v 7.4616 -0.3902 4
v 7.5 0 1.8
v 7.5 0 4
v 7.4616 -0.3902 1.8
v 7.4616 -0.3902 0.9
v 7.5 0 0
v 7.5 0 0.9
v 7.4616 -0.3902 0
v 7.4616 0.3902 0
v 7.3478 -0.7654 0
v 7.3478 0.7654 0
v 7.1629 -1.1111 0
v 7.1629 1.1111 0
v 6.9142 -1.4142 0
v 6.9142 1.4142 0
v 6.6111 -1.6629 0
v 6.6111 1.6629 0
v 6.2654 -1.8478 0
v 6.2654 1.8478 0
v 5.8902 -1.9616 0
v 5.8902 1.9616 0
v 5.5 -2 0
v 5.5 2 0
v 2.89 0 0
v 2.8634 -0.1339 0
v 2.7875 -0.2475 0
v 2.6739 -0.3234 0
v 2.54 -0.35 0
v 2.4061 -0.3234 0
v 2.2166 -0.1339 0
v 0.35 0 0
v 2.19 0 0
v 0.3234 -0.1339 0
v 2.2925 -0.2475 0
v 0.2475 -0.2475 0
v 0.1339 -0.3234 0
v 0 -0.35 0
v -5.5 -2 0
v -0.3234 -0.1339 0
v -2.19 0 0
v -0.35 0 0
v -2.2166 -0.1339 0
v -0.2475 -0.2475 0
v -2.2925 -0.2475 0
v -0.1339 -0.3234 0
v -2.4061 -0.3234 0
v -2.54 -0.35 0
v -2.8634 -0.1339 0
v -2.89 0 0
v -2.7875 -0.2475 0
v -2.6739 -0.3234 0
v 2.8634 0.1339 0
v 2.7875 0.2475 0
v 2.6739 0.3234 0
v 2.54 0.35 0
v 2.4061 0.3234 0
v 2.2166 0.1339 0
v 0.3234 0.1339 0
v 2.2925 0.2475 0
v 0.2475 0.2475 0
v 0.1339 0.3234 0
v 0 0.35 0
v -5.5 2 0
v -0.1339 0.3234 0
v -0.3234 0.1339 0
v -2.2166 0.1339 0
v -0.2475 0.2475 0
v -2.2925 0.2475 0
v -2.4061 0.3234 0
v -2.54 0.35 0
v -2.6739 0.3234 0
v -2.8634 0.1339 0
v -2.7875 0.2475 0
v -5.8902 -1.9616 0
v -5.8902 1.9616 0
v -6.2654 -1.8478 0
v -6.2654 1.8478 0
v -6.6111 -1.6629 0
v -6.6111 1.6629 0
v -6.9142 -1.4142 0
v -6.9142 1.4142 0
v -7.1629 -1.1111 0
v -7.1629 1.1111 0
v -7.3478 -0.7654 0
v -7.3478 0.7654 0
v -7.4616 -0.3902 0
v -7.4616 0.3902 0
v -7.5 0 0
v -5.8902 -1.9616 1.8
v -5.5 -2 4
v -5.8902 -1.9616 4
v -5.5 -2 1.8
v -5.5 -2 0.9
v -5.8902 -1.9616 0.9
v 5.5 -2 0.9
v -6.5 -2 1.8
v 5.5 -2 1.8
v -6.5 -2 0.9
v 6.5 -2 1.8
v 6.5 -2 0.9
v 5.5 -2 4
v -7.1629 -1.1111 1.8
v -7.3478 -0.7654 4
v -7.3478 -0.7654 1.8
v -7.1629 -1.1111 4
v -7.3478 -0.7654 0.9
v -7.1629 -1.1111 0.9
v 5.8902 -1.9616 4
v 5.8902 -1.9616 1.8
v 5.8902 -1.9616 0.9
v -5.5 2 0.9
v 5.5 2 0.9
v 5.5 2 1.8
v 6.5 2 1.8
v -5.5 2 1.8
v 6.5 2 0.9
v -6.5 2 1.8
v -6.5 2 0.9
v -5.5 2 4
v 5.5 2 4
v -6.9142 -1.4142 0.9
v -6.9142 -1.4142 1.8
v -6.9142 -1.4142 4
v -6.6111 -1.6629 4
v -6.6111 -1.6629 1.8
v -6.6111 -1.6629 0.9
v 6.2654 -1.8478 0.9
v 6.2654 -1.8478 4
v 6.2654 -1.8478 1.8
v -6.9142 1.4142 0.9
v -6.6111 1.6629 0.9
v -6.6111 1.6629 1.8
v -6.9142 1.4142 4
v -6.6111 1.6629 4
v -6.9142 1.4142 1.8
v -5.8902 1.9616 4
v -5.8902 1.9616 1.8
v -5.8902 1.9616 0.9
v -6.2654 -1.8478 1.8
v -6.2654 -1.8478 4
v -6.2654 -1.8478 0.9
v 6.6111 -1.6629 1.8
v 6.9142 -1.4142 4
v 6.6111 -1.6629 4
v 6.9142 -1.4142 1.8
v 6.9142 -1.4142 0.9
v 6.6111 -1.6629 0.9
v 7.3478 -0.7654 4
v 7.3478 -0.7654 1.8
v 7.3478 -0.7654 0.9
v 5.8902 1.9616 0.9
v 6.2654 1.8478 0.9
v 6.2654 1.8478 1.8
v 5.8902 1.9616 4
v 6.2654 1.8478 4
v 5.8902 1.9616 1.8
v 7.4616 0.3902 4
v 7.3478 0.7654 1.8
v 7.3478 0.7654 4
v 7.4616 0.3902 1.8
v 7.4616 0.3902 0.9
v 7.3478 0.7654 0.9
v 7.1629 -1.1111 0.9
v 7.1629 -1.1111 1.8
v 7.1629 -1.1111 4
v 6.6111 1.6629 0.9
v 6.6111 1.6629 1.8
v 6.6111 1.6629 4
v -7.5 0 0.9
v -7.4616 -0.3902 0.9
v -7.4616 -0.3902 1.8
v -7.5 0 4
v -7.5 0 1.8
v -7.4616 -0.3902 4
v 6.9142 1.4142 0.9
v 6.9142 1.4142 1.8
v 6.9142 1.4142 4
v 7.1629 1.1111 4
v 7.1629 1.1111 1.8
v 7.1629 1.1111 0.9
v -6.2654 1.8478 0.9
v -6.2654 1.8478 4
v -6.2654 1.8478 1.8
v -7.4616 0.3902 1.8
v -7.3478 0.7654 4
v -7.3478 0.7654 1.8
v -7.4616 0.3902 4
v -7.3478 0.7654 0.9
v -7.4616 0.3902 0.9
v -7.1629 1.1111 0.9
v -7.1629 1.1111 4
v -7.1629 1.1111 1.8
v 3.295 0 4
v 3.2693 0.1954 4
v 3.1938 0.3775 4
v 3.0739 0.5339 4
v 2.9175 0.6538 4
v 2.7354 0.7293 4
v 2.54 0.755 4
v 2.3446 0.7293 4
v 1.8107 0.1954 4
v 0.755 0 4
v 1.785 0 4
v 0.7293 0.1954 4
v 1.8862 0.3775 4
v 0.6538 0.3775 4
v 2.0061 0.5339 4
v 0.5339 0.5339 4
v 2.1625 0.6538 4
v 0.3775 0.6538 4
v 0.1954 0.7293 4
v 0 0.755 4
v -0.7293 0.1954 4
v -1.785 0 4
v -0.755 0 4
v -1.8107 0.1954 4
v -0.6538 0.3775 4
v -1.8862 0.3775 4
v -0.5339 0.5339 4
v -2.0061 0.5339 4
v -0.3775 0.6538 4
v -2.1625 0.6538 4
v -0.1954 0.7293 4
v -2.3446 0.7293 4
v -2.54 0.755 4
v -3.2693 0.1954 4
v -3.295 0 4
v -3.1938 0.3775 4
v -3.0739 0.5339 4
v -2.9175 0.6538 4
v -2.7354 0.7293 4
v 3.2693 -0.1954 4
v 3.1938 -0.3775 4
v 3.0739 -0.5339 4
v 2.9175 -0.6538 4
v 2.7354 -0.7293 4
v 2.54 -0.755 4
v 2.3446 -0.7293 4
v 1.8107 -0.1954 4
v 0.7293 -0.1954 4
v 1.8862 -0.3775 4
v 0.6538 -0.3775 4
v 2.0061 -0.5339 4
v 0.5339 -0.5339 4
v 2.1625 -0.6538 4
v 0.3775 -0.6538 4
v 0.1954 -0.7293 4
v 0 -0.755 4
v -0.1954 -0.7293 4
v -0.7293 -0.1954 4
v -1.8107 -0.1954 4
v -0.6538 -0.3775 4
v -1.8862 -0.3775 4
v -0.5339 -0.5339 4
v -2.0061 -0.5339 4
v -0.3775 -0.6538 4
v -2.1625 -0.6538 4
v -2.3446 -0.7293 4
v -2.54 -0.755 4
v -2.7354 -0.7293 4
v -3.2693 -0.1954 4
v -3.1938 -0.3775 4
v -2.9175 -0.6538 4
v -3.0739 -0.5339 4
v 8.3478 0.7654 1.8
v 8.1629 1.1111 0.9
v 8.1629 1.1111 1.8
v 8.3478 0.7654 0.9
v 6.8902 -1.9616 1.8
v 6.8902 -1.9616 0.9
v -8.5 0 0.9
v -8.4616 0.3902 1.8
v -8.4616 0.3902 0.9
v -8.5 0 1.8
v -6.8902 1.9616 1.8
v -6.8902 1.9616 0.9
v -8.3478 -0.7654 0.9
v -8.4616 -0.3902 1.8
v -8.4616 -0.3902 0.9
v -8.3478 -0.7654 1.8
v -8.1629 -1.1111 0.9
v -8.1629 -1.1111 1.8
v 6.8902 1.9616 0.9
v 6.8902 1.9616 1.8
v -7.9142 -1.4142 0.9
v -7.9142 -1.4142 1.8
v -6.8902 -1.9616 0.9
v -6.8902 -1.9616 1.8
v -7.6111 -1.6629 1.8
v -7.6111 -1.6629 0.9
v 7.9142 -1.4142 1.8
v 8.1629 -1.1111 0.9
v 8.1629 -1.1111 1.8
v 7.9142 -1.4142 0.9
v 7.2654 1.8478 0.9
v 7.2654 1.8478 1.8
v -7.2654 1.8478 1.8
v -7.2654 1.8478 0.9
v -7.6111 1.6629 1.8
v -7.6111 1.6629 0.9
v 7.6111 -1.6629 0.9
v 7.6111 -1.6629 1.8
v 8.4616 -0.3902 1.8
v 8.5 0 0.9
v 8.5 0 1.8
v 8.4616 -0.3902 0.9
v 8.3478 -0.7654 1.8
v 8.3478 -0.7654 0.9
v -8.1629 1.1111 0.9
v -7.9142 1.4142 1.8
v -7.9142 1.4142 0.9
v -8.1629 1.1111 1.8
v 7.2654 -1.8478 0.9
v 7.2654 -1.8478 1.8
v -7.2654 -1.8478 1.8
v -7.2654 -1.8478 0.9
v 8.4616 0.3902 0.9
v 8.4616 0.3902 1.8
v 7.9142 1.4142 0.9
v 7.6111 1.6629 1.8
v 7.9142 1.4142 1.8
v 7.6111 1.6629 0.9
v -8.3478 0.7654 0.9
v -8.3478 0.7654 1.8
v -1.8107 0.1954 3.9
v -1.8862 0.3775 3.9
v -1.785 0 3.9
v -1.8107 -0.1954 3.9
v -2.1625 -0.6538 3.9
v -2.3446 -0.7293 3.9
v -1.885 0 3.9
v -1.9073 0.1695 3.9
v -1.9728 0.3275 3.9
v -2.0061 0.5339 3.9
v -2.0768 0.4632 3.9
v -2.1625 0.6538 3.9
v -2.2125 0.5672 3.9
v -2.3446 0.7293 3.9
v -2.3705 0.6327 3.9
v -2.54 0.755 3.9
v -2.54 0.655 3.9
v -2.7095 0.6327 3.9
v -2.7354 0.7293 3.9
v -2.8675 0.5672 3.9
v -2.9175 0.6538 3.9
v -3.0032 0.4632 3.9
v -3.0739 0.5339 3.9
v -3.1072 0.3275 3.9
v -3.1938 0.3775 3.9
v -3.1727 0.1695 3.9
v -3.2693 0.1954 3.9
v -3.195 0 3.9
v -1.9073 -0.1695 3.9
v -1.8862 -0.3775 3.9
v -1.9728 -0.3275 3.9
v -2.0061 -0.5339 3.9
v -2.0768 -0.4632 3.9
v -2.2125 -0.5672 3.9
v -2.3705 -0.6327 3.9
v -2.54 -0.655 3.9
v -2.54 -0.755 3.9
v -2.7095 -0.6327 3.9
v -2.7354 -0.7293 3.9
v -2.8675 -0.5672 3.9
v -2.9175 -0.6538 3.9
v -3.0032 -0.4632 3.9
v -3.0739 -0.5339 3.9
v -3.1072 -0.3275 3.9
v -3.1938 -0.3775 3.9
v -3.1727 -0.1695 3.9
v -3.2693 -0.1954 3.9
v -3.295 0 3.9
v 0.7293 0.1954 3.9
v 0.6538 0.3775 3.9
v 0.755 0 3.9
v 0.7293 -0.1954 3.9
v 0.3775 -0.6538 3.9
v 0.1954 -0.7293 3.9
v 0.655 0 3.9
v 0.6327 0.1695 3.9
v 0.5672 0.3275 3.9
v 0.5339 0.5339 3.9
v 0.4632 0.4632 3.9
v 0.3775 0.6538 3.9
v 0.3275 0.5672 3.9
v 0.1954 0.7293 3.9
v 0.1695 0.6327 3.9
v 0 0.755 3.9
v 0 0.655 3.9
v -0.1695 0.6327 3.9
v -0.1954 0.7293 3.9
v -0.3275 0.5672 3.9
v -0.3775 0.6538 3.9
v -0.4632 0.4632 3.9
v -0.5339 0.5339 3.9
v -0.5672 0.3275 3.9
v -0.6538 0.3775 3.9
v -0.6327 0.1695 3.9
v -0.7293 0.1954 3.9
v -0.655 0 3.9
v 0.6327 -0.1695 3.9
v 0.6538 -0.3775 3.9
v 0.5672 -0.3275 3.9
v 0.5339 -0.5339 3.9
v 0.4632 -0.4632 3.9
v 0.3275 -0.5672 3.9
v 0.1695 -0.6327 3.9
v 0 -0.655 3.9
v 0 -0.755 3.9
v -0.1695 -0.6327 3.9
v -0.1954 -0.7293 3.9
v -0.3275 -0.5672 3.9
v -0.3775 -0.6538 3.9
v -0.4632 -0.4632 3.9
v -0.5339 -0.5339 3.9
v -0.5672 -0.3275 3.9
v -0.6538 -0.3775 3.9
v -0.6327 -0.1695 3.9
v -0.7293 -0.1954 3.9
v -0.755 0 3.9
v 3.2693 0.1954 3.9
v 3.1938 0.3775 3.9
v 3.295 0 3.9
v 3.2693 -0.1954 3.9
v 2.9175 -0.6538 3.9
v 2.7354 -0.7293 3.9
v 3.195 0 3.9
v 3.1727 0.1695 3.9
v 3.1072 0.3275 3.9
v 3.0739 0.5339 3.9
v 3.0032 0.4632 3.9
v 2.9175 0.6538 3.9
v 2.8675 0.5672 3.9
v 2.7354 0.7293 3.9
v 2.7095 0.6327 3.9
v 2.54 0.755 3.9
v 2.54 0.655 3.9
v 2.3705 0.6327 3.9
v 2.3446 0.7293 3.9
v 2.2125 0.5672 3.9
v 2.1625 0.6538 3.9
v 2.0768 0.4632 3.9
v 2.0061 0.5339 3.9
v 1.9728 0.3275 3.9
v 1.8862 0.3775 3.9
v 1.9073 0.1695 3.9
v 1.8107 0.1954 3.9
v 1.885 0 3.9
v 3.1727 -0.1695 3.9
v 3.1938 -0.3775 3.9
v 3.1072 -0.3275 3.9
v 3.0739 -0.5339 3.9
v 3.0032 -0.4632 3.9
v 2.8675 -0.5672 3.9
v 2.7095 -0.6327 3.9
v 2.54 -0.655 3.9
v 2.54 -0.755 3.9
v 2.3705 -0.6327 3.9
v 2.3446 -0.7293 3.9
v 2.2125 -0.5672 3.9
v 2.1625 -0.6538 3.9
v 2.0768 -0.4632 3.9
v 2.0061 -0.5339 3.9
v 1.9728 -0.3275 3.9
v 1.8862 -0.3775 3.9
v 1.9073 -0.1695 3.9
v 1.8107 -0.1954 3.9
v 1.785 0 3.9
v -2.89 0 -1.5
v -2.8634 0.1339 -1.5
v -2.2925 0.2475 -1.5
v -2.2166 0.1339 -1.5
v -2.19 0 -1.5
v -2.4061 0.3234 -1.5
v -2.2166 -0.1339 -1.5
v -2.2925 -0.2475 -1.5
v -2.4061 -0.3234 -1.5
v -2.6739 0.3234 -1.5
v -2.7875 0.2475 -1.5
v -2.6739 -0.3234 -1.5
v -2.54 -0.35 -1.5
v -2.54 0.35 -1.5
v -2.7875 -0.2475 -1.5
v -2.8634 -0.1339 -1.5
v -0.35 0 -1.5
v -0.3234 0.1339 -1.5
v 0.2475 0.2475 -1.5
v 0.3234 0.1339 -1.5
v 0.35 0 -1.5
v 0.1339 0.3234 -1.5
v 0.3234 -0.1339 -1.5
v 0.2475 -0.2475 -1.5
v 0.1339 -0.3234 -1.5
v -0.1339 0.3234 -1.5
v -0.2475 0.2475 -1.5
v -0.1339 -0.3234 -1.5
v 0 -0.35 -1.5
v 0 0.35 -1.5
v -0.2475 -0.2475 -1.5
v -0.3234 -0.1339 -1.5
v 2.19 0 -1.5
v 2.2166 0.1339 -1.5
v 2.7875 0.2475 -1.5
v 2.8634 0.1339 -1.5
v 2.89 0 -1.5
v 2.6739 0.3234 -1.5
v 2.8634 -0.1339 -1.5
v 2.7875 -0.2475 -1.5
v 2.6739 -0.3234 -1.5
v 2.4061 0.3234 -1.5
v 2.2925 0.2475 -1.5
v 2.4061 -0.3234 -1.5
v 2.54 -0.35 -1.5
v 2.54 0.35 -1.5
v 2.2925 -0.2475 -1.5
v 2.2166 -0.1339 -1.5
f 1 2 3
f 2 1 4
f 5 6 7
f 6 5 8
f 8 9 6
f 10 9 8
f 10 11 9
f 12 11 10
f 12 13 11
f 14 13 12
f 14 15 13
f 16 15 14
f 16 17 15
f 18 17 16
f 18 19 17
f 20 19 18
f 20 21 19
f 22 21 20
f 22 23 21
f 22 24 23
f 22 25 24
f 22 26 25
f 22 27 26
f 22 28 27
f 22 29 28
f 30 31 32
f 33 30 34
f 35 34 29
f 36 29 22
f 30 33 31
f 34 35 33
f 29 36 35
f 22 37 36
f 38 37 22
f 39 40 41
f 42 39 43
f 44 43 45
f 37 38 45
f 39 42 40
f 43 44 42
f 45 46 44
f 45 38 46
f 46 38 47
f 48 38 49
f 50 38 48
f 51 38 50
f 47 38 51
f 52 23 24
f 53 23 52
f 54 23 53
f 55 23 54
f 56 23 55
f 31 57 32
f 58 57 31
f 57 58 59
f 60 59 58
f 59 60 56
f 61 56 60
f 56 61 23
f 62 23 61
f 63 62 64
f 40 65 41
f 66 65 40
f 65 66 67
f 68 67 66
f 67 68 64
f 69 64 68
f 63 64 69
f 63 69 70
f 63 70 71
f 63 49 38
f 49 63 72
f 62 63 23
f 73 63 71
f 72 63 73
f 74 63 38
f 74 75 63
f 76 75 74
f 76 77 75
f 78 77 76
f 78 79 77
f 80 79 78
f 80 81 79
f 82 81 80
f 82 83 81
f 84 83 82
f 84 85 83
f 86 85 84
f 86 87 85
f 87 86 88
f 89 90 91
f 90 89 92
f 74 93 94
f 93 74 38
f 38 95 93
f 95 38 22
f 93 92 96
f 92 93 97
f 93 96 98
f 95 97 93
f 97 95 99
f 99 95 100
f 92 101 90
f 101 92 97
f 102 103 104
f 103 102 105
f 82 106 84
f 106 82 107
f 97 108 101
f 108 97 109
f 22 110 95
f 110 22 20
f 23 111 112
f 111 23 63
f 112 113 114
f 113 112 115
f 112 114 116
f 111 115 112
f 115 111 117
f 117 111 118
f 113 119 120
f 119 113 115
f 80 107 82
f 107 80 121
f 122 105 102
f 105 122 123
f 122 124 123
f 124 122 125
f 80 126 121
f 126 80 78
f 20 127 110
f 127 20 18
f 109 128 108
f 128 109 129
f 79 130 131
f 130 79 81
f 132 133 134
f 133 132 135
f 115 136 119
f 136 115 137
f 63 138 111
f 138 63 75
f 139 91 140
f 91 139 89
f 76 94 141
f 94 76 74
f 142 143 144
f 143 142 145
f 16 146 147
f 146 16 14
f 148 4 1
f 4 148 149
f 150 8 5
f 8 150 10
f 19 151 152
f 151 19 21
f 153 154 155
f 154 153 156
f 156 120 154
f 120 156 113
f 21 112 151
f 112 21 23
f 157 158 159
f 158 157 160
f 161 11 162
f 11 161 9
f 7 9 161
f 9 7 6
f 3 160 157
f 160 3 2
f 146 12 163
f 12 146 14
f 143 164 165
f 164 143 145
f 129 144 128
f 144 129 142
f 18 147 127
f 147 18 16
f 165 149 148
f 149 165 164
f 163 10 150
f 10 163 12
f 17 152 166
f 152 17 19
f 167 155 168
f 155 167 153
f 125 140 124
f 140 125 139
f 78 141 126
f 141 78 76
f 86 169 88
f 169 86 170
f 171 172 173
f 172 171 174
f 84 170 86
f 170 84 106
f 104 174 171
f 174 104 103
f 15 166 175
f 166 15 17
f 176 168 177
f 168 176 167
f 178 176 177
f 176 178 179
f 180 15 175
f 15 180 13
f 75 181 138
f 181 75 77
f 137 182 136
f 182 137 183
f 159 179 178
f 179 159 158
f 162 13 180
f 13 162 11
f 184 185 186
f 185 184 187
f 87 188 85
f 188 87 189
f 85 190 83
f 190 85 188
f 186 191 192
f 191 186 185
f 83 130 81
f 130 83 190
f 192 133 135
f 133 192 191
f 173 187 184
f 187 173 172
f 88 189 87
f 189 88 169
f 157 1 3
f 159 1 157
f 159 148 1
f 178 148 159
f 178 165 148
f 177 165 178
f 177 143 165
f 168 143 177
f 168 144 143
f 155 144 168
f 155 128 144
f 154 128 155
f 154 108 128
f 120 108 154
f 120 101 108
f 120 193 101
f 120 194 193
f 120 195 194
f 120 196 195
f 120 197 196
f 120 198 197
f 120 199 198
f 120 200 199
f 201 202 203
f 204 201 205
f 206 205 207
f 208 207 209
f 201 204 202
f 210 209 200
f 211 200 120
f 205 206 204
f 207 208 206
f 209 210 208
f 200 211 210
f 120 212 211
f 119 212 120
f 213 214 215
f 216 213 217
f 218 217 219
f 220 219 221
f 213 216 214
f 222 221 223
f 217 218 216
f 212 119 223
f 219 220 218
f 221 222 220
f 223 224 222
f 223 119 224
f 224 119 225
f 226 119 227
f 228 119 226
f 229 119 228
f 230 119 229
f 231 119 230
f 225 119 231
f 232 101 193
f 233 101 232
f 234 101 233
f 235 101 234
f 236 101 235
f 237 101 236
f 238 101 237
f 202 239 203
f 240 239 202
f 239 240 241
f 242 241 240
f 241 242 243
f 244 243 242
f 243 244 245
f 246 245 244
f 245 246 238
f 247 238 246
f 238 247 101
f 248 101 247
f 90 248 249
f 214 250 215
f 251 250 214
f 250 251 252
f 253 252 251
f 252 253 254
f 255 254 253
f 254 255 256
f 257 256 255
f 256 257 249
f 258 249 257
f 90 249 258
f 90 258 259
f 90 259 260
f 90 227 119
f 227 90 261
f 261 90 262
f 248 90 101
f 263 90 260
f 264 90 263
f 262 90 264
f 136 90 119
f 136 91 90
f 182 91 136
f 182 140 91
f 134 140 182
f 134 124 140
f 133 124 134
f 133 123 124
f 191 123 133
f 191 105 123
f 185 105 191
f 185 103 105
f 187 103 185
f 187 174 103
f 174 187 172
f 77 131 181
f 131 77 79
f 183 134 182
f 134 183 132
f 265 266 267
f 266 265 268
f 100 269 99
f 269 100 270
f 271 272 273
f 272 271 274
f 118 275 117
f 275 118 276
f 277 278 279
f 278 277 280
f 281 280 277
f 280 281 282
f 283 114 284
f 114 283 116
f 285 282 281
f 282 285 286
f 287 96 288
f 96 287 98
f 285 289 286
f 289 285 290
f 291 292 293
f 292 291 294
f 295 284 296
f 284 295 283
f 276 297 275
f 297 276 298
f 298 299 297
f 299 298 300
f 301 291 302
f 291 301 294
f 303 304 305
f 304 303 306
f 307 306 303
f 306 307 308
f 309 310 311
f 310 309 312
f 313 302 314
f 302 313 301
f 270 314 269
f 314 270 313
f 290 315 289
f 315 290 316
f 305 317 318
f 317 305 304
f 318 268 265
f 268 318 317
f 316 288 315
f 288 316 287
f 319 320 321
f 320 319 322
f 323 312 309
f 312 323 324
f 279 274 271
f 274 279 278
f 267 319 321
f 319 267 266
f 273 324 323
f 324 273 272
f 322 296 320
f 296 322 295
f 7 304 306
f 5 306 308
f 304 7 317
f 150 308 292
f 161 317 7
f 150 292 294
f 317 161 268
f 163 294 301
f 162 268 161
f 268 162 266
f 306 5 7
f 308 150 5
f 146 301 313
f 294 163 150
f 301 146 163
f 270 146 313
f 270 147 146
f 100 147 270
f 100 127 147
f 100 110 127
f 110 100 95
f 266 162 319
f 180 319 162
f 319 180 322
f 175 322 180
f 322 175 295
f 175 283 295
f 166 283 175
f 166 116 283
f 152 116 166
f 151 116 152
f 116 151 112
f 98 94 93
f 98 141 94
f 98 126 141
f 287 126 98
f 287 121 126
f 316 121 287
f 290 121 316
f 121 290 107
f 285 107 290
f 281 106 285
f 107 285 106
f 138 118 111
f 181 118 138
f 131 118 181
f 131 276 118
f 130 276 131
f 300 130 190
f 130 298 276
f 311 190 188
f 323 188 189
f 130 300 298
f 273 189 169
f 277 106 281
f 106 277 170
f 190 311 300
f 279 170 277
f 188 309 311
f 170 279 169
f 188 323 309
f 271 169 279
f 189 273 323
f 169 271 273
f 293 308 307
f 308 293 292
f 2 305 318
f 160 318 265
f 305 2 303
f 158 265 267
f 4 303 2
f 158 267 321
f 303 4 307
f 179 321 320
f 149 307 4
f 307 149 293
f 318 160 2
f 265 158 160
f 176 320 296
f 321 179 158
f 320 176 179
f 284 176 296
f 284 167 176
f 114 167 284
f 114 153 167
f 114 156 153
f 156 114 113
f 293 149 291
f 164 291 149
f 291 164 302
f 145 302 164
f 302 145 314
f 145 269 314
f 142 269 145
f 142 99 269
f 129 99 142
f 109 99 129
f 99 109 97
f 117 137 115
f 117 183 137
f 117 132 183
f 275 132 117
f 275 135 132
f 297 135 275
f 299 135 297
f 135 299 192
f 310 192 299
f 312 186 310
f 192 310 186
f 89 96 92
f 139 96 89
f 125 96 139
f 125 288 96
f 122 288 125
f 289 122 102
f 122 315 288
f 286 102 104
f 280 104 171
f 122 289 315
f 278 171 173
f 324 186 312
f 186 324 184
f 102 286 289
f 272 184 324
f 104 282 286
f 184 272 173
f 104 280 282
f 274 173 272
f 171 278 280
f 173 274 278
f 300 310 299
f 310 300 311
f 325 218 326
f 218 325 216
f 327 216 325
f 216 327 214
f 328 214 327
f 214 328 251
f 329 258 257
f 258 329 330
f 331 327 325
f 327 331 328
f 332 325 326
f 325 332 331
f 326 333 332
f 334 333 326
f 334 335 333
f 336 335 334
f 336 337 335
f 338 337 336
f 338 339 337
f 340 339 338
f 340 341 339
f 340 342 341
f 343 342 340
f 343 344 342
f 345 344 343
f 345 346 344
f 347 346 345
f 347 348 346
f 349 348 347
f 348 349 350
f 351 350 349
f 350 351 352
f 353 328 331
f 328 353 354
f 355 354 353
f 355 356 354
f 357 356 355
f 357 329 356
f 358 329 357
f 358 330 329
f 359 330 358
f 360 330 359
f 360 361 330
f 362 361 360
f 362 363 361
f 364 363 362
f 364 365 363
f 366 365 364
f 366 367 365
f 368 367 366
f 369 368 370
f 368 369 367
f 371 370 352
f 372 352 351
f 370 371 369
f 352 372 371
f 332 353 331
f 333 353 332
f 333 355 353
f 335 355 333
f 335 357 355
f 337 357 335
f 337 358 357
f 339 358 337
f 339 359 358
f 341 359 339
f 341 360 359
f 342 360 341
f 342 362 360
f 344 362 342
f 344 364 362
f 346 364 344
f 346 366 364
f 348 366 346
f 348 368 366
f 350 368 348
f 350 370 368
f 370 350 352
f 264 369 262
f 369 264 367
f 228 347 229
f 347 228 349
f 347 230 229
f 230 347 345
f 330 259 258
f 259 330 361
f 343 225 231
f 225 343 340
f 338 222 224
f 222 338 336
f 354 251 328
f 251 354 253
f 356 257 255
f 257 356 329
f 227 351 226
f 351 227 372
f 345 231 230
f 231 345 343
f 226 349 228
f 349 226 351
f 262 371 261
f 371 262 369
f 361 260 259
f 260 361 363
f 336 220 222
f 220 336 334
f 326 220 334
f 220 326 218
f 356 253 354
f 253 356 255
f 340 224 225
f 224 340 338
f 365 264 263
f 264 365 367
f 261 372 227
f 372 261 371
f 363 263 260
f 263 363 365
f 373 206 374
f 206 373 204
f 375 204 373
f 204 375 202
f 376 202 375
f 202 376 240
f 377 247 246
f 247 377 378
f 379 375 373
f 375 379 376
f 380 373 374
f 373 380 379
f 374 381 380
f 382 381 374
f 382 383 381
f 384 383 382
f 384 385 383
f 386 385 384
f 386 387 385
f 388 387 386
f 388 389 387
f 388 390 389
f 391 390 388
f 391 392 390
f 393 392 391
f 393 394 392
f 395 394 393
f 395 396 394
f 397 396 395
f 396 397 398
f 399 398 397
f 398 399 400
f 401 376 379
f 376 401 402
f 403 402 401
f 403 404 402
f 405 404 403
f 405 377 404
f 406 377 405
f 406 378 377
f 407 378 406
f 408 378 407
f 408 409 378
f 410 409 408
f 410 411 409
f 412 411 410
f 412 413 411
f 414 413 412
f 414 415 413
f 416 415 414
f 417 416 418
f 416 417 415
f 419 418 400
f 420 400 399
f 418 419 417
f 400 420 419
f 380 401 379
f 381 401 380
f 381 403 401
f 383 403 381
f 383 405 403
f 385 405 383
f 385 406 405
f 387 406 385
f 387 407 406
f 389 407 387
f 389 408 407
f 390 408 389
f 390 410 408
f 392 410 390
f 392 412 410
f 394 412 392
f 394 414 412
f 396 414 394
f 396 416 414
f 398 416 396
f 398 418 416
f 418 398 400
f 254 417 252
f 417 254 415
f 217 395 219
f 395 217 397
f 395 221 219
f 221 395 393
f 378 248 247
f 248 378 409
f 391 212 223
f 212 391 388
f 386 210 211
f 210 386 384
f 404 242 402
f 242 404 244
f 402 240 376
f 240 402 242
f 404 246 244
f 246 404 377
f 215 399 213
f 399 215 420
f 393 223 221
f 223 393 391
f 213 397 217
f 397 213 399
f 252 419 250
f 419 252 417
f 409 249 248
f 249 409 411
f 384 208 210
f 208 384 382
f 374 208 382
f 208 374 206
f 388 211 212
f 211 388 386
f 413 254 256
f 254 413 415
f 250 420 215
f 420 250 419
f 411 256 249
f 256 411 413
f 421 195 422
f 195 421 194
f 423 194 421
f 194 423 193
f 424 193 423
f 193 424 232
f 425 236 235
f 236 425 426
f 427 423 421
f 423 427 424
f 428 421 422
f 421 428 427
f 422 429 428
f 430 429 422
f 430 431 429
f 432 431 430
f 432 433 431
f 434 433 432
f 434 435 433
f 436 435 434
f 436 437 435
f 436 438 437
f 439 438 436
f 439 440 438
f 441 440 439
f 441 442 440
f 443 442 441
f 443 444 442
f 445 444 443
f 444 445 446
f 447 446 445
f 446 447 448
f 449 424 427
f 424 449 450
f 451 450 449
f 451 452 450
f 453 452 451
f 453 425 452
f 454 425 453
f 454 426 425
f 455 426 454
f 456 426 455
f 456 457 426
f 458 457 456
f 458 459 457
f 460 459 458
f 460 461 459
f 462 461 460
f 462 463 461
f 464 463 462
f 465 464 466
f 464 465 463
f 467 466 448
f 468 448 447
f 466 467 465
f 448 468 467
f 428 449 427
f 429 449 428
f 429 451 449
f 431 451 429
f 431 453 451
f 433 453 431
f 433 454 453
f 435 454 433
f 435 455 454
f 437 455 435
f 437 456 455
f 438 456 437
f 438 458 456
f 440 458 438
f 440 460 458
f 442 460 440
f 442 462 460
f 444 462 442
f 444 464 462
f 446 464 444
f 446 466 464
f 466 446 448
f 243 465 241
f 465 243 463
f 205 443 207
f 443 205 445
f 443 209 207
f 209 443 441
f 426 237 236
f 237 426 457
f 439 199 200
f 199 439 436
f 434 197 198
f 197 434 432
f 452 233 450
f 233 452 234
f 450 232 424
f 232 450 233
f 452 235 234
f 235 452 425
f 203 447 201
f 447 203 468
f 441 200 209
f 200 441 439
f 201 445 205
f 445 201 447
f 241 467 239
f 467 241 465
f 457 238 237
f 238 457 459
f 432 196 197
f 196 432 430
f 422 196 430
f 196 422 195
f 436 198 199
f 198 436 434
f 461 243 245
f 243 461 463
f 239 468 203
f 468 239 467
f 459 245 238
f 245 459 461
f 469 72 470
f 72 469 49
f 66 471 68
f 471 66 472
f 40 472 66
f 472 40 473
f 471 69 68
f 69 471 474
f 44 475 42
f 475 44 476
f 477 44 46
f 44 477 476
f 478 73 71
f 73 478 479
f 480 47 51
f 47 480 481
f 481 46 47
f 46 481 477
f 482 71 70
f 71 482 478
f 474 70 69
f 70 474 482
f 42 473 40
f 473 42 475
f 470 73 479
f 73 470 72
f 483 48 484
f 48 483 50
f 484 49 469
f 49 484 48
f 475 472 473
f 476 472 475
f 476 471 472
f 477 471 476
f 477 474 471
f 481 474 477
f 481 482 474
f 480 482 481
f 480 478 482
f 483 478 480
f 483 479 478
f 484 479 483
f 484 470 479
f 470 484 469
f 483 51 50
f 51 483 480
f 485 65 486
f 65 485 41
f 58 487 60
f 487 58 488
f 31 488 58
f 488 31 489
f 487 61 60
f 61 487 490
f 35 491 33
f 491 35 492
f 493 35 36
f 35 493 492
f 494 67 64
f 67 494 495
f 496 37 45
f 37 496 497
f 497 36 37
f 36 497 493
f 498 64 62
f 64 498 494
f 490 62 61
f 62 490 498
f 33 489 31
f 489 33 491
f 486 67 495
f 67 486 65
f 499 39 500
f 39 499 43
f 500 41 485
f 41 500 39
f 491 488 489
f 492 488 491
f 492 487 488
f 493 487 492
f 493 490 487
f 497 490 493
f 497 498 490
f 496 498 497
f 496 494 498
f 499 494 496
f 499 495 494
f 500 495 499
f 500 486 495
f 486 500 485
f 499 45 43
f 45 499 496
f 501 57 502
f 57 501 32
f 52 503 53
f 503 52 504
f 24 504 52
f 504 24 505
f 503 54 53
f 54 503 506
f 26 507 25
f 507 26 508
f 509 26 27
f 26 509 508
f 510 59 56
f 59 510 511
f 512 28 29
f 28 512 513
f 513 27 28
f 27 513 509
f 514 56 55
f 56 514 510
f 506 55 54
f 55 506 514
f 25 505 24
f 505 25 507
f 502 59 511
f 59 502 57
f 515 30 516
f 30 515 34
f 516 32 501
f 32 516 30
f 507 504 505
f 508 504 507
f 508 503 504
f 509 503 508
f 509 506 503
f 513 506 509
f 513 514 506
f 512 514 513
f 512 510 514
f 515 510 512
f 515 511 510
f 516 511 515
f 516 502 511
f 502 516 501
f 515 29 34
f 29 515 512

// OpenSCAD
// =====================================================
//  Conector magnético Pogo Pin 3 pines — HEMBRA (contactos planos)
//  Montaje: con cables (colas traseras para soldar)
//  Derivada del plano del macho "3Pin spacing 2.54mm":
//  misma cara de acople, imanes con polaridad invertida (S izq., N der.)
//  Ejes: X = largo (contactos alineados en X), Y = ancho, Z = alto
//  Origen: centro de la base; cara de acople en Z = alto_cuerpo
//  Unidades: milímetros
// =====================================================

// ================= VARIABLES GLOBALES =================

// --- 1. Cuerpo (óvalo / estadio) ---
largo_cuerpo    = 15;
ancho_cuerpo    = 4;
alto_cuerpo     = 4;

// --- 2. Pestaña perimetral ---
largo_pestana   = 17;
pestana_z0      = 0.9;
pestana_esp     = 0.9;

// --- 3. Imanes (S a la izquierda, N a la derecha) ---
sep_imanes      = 11;
d_iman          = 3;
alto_iman       = 2;

// --- 4. Contactos planos ---
n_pines         = 3;
paso            = 2.54;
d_contacto      = 1.51;  // mismo Ø que el alojamiento del pin macho
rebaje_contacto = 0.1;   // leve hundimiento para que el contacto se distinga en el STEP
d_cola          = 0.7;
largo_cola      = 1.5;

// --- Calidad / tolerancias ---
eps = 0.01;
$fn = 32;


// ================= UTILIDADES =================
module estadio(L, A, H) {
    hull()
        for (x = [-(L - A) / 2, (L - A) / 2])
            translate([x, 0, 0]) cylinder(d = A, h = H);
}

function x_pin(i) = (i - (n_pines - 1) / 2) * paso;


// ================= 1-2. CARCASA =================
module carcasa() {
    estadio(largo_cuerpo, ancho_cuerpo, alto_cuerpo);
    translate([0, 0, pestana_z0])
        estadio(largo_pestana, ancho_cuerpo, pestana_esp);
}

// Asientos de los contactos (hundidos rebaje_contacto en la cara de acople)
module rebajes() {
    for (i = [0 : n_pines - 1])
        translate([x_pin(i), 0, alto_cuerpo - rebaje_contacto])
            cylinder(d = d_contacto, h = rebaje_contacto + 1, $fn = 24);
}


// ================= 3. IMANES =================
module imanes() {
    for (x = [-sep_imanes / 2, sep_imanes / 2])
        translate([x, 0, alto_cuerpo - alto_iman])
            cylinder(d = d_iman, h = alto_iman);
}


// ================= 4. CONTACTOS =================
// Disco de contacto + cola trasera para soldar el cable
module contacto() {
    translate([0, 0, alto_cuerpo - rebaje_contacto - 1])
        cylinder(d = d_contacto - 0.2, h = 1, $fn = 24);   // queda dentro del asiento
    translate([0, 0, -largo_cola])
        cylinder(d = d_cola, h = largo_cola + eps, $fn = 16);
}

module contactos() {
    for (i = [0 : n_pines - 1])
        translate([x_pin(i), 0, 0]) contacto();
}


// ================= ENSAMBLE =================
module pogo_hembra() {
    color("#1c1c1c") difference() { carcasa(); rebajes(); }
    color("#9a9a9a") imanes();
    color("#d4af37") contactos();
}

pogo_hembra();
